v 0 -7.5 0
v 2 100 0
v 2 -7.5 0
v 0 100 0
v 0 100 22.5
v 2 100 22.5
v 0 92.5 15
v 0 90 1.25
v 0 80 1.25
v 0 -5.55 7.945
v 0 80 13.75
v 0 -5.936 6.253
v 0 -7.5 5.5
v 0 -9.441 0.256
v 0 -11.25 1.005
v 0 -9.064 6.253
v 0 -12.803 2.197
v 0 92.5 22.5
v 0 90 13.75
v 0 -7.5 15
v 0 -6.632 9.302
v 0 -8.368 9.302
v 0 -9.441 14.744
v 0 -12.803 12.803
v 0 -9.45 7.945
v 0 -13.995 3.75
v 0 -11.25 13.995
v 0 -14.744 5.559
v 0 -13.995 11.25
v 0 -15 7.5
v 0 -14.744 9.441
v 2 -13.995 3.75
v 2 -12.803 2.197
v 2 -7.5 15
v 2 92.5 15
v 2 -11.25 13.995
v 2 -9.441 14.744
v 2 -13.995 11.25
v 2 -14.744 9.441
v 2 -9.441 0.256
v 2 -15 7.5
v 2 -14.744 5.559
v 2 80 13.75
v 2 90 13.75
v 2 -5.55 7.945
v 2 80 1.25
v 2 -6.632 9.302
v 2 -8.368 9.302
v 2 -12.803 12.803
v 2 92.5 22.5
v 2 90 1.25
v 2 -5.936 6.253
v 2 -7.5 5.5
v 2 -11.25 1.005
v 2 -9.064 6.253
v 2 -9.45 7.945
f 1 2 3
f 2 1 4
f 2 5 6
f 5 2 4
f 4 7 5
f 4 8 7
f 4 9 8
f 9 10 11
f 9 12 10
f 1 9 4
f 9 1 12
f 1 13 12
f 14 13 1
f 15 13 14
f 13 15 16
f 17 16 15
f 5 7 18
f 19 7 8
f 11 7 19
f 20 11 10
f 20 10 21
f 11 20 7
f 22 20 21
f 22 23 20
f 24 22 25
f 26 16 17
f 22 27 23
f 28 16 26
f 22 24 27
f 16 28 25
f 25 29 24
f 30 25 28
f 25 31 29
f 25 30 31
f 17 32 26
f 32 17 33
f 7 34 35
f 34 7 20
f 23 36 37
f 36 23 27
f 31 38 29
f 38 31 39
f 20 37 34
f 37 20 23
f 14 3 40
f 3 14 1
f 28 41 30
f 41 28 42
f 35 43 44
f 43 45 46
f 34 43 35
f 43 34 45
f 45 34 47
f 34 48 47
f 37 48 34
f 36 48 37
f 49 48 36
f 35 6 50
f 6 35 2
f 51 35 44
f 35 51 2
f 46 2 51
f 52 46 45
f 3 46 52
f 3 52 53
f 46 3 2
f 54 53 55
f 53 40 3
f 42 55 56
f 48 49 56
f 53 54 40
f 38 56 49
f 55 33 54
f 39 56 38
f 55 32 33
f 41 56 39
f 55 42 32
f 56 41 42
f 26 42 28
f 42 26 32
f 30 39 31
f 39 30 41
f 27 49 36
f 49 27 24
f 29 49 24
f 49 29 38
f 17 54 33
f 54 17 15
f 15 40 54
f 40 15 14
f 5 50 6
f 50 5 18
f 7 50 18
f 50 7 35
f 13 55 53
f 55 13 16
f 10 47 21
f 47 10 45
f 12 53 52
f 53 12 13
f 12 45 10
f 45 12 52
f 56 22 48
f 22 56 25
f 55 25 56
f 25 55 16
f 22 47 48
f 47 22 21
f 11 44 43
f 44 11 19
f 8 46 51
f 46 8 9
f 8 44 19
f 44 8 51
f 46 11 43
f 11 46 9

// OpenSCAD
eps =0.1;



//slider_height = 10;
//rail_height=15;
//rail_width = 2;
//rail_length=100;
//synchole_rad = 2;




//window_length = 10;
//window_height=12.5;
//
//window_location = 0.8 * rail_length; // later set this in relation to the chamber location
//
//tailhook_length = 7.5;
//tailhook_height = 7.5; // how far above does the tailhook protrude?




module slider(rail_height=15,rail_width =2,rail_length=100, synchole_rad = 2, window_length = 10, window_height=12.5, window_location = 80, tailhook_length = 7.5, tailhook_height = 7.5){

        difference(){
        
        union(){
            hull()
            {cube([rail_width, rail_length, rail_height]);
            translate([0,-rail_height/2,rail_height/2])rotate([0,90,0]) cylinder(h=rail_width, r=rail_height/2);


            } // the base form of the slider

            color(c=[0,0,1]) translate([0,rail_length-tailhook_length,(rail_height-eps)]) cube([rail_width, tailhook_length, tailhook_height+eps]);

            
        }



            color(c=[1,0,0])translate([-rail_width/2,-rail_height/2,rail_height/2])rotate([0,90,0]) cylinder(h=rail_width*2, r=synchole_rad);//cutout hole for grip, or to put a skewer through to pull both out at once

            color(c=[0,1,0]) translate([-rail_width/2,window_location,(rail_height-window_height)/2]) cube([rail_width*2, window_length, window_height]);//cutout window for the flies to go through
        }
}

slider();
